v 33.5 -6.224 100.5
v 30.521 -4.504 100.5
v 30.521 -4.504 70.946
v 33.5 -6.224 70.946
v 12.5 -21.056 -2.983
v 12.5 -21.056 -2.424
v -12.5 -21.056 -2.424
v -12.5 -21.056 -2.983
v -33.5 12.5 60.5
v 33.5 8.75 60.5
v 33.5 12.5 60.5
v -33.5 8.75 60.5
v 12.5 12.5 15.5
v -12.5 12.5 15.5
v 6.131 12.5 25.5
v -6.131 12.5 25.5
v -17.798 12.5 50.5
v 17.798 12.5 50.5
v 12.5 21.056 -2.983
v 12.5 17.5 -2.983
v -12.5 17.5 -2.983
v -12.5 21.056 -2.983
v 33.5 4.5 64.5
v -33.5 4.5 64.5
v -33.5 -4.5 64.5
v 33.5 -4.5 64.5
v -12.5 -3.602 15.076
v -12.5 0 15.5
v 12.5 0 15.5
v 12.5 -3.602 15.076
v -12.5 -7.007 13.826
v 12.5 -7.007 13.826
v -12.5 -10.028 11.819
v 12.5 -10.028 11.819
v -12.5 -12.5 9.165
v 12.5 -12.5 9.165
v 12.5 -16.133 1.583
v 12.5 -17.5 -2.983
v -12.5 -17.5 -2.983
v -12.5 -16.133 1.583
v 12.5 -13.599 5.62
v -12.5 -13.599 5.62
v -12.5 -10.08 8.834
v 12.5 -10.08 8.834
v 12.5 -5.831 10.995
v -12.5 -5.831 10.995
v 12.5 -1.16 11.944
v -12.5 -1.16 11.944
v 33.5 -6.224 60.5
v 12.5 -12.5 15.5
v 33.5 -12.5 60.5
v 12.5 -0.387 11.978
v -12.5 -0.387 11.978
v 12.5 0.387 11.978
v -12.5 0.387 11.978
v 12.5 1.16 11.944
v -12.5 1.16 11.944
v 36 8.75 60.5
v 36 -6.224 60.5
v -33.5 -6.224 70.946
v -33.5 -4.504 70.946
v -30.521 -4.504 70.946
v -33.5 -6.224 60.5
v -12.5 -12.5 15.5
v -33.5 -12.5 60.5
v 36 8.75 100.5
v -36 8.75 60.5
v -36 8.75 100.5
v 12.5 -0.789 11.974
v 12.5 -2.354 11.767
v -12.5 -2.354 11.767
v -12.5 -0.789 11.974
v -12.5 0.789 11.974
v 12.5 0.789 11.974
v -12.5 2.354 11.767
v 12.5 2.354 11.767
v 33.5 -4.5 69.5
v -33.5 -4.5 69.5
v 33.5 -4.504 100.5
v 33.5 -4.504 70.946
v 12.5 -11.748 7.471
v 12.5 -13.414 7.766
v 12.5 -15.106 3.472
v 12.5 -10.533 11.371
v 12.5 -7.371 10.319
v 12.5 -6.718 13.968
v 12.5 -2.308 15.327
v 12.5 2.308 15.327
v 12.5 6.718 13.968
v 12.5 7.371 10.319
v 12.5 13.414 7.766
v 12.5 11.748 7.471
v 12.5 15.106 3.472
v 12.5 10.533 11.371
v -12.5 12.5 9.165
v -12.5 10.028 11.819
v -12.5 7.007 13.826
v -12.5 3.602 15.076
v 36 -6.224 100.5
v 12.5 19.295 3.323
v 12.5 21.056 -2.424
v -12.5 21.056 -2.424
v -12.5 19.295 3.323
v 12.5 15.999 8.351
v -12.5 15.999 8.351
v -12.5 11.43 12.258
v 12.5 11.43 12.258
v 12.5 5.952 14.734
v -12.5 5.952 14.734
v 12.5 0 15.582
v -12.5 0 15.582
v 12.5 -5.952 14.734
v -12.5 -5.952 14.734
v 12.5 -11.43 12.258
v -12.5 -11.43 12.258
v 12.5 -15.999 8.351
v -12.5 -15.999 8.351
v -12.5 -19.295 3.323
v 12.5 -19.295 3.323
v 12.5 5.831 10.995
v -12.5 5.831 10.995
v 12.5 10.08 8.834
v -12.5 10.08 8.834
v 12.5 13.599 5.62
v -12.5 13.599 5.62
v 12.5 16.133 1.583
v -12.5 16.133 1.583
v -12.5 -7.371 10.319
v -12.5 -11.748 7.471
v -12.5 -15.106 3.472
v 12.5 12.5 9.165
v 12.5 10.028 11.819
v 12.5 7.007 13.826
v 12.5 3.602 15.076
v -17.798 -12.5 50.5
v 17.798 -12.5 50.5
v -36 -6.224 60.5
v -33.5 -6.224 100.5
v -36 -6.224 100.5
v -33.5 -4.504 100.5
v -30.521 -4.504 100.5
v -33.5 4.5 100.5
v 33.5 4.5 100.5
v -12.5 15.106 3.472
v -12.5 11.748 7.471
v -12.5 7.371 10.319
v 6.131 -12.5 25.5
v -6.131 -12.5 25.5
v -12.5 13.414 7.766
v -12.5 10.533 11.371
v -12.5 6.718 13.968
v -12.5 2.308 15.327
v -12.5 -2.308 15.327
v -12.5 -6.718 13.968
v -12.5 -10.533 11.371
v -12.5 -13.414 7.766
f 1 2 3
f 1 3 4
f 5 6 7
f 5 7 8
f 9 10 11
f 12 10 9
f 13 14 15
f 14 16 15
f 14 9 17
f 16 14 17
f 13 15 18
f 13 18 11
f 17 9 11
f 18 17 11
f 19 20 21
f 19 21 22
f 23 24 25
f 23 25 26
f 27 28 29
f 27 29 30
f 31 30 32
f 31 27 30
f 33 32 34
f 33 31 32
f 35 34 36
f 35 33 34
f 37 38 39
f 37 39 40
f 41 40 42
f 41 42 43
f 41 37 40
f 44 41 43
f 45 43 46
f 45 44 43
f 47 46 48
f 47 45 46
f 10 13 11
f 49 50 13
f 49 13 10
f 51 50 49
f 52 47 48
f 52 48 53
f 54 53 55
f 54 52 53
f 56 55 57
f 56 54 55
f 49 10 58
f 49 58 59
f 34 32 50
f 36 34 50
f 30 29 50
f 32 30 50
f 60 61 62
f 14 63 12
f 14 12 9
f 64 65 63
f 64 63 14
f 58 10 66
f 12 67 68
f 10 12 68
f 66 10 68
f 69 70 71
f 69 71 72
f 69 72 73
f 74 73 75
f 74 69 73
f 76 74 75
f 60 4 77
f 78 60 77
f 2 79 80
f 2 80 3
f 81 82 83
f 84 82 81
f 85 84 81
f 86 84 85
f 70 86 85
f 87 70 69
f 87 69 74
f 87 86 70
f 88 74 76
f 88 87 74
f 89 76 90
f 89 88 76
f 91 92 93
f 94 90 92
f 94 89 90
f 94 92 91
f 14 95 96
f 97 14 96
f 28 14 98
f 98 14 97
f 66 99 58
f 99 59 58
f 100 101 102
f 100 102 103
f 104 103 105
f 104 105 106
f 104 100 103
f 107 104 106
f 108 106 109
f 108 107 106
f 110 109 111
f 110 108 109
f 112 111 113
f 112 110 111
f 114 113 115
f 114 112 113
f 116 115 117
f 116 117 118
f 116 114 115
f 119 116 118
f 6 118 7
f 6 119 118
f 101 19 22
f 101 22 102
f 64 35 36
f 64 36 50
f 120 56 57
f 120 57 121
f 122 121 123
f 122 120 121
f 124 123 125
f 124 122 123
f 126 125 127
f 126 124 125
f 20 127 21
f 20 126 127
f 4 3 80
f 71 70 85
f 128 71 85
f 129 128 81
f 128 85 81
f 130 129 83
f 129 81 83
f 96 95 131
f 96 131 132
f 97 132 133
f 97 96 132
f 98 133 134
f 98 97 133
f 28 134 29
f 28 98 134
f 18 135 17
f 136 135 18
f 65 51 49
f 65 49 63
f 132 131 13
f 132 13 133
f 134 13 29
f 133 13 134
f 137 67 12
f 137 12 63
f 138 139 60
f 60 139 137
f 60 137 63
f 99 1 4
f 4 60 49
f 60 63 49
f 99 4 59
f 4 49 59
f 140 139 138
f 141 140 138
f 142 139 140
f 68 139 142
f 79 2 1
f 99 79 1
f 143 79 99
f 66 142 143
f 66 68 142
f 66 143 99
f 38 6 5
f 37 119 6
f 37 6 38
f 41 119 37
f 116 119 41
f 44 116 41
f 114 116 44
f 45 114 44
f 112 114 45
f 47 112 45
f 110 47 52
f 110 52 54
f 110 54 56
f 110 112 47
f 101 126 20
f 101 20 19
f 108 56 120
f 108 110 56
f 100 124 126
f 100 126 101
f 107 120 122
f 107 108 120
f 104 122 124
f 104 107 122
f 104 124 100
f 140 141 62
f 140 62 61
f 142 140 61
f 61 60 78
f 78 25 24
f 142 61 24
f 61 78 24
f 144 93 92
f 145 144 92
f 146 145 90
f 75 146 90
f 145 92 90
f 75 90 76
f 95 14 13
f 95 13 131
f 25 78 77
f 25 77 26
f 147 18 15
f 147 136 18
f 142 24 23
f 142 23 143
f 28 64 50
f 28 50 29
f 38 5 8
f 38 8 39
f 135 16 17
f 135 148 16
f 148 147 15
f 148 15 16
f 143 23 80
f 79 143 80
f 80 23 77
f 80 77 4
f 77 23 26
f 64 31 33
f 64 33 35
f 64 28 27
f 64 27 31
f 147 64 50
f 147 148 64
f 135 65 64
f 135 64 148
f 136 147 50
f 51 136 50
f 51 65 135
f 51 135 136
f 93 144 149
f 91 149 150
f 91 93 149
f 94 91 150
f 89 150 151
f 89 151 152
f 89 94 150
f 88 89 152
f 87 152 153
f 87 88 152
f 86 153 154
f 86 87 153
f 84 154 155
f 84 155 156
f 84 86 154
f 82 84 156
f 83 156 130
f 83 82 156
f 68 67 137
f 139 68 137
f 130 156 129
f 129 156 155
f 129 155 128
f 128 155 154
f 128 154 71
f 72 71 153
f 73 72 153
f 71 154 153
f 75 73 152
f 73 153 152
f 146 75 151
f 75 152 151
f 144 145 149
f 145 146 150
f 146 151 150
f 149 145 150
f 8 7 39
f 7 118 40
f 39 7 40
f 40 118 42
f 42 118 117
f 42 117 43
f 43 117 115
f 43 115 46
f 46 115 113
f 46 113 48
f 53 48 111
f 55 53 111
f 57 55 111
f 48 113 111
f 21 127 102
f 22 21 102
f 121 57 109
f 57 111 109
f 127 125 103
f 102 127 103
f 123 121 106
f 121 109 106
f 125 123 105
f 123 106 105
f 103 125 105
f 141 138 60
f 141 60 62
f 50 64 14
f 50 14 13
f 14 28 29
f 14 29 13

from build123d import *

# Parameters (mm, degrees)
F1_DEPTH  = 12.5
F3_DEPTH  = 12.5
F5_DEPTH  = 25
F6_W      = 72
F6_H      = 9
F7_DEPTH  = 4
F9_DEPTH  = 72
F10_W     = 2.5
F10_H     = 10.446272
F11_DEPTH = 10.7236
F12_W     = 4.25
F12_H     = 40
F13_DEPTH = 72
F15_DEPTH = 29.553728
F17_DEPTH = 29.553728
F19_DEPTH = 25
F21_DEPTH = 25


with BuildPart() as f1:
    # F0 (on Right) → F1 (new body, symmetric)
    with BuildSketch(Plane.YZ):
        with BuildLine():
            Line((11.59111, -3.105829), (14.97185, -4.011695))
            ThreePointArc((14.97185, -4.011695), (0, 15.5), (-14.97185, -4.011695))
            Line((-14.97185, -4.011695), (-11.59111, -3.105829))
            ThreePointArc((-11.59111, -3.105829), (0, 12), (11.59111, -3.105829))
        make_face()
    extrude(amount=F1_DEPTH, both=True)

    # F20 (on face) → F21 (cut)
    with BuildSketch(Plane.YZ.offset(12.5)):
        with BuildLine():
            Line((0.34308, -12.669018), (17.5, -2.983259))
            ThreePointArc((17.5, -2.983259), (0, 11.923873), (-17.5, -2.983259))
            Line((-17.5, -2.983259), (0.34308, -12.669018))
        make_face()
    extrude(amount=-F21_DEPTH, mode=Mode.SUBTRACT)


with BuildPart() as f3:
    # F2 (on Front) → F3 (new body, symmetric)
    with BuildSketch(Plane.XZ):
        Polygon((-33.5, 60.5), (-12.5, 15.5), (12.5, 15.5), (33.5, 60.5), (0, 60.5), align=None)
        Polygon((6.13137, 25.5), (-6.13137, 25.5), (-17.798036, 50.5), (17.798036, 50.5), align=None, mode=Mode.SUBTRACT)
    extrude(amount=F3_DEPTH, both=True)

    # F6 (on face) → F7 (join)
    with BuildSketch(Plane.XY.offset(60.5)):
        Rectangle(F6_W, F6_H)
    extrude(amount=F7_DEPTH)

    # F8 (on face) → F9 (join)
    with BuildSketch(Plane(origin=(-36, 0, 0), x_dir=(0, -1, 0), z_dir=(-1, 0, 0))):
        Polygon((4.5, 69.5), (4.5, 64.5), (4.5, 60.5), (6.2236, 60.5), (6.2236, 70.946272), align=None)
    extrude(amount=-F9_DEPTH)

    # F10 (on face) → F11 (join, through all)
    with BuildSketch(Plane.XZ.offset(6.2236)):
        with Locations((-34.75, 65.723136)):
            Rectangle(F10_W, F10_H)
        with Locations((34.75, 65.723136)):
            Rectangle(F10_W, F10_H)
    extrude(amount=-F11_DEPTH)

    # F12 (on face) → F13 (join, through all)
    with BuildSketch(Plane(origin=(-36, 0, 0), x_dir=(0, -1, 0), z_dir=(-1, 0, 0))):
        with Locations((-6.625, 80.5)):
            Rectangle(F12_W, F12_H)
    extrude(amount=-F13_DEPTH)

    # F14 (on face) → F15 (join, through all)
    with BuildSketch(Plane.XY.offset(70.946272)):
        Polygon((-36, -6.2236), (-33.5, -6.2236), (-30.520873, -4.5036), (-33.5, -4.5036), (-33.5, 4.5), (-36, 4.5), align=None)
    extrude(amount=F15_DEPTH)

    # F16 (on face) → F17 (join, through all)
    with BuildSketch(Plane.XY.offset(70.946272)):
        Polygon((36, 4.5), (33.5, 4.5), (33.5, -4.5036), (30.520873, -4.5036), (33.5, -6.2236), (36, -6.2236), align=None)
    extrude(amount=F17_DEPTH)


with BuildPart() as f5:
    # F4 (on face) → F5 (new body)
    with BuildSketch(Plane(origin=(-12.5, 0, 0), x_dir=(0, -1, 0), z_dir=(-1, 0, 0))):
        with BuildLine():
            ThreePointArc((-12.5, 9.165151), (-7.006788, 13.825879), (0, 15.5))
            Line((0, 15.5), (-12.5, 15.5))
            Line((-12.5, 15.5), (-12.5, 9.165151))
        make_face()
        with BuildLine():
            Line((12.5, 15.5), (0, 15.5))
            ThreePointArc((0, 15.5), (7.006788, 13.825879), (12.5, 9.165151))
            Line((12.5, 9.165151), (12.5, 15.5))
        make_face()
    extrude(amount=-F5_DEPTH)


with BuildPart() as f19:
    # F18 (on face) → F19 (new body)
    with BuildSketch(Plane.YZ.offset(12.5)):
        with BuildLine():
            ThreePointArc((-1.16018, 11.943784), (0, 11.981817), (1.16018, 11.943784))
            ThreePointArc((1.16018, 11.943784), (0, 12), (-1.16018, 11.943784))
        make_face()
        with BuildLine():
            ThreePointArc((-1.16018, 11.943784), (0, 12), (1.16018, 11.943784))
            ThreePointArc((1.16018, 11.943784), (11.948001, 7.345947), (17.5, -2.983259))
            Line((17.5, -2.983259), (21.056369, -2.983259))
            Line((21.056369, -2.983259), (21.056369, -2.424479))
            ThreePointArc((21.056369, -2.424479), (0, 15.581816), (-21.056369, -2.424479))
            Line((-21.056369, -2.424479), (-21.056369, -2.983259))
            Line((-21.056369, -2.983259), (-17.5, -2.983259))
            ThreePointArc((-17.5, -2.983259), (-11.948001, 7.345947), (-1.16018, 11.943784))
        make_face()
    extrude(amount=-F19_DEPTH)


solid = Compound([f1.part, f3.part, f5.part, f19.part])
